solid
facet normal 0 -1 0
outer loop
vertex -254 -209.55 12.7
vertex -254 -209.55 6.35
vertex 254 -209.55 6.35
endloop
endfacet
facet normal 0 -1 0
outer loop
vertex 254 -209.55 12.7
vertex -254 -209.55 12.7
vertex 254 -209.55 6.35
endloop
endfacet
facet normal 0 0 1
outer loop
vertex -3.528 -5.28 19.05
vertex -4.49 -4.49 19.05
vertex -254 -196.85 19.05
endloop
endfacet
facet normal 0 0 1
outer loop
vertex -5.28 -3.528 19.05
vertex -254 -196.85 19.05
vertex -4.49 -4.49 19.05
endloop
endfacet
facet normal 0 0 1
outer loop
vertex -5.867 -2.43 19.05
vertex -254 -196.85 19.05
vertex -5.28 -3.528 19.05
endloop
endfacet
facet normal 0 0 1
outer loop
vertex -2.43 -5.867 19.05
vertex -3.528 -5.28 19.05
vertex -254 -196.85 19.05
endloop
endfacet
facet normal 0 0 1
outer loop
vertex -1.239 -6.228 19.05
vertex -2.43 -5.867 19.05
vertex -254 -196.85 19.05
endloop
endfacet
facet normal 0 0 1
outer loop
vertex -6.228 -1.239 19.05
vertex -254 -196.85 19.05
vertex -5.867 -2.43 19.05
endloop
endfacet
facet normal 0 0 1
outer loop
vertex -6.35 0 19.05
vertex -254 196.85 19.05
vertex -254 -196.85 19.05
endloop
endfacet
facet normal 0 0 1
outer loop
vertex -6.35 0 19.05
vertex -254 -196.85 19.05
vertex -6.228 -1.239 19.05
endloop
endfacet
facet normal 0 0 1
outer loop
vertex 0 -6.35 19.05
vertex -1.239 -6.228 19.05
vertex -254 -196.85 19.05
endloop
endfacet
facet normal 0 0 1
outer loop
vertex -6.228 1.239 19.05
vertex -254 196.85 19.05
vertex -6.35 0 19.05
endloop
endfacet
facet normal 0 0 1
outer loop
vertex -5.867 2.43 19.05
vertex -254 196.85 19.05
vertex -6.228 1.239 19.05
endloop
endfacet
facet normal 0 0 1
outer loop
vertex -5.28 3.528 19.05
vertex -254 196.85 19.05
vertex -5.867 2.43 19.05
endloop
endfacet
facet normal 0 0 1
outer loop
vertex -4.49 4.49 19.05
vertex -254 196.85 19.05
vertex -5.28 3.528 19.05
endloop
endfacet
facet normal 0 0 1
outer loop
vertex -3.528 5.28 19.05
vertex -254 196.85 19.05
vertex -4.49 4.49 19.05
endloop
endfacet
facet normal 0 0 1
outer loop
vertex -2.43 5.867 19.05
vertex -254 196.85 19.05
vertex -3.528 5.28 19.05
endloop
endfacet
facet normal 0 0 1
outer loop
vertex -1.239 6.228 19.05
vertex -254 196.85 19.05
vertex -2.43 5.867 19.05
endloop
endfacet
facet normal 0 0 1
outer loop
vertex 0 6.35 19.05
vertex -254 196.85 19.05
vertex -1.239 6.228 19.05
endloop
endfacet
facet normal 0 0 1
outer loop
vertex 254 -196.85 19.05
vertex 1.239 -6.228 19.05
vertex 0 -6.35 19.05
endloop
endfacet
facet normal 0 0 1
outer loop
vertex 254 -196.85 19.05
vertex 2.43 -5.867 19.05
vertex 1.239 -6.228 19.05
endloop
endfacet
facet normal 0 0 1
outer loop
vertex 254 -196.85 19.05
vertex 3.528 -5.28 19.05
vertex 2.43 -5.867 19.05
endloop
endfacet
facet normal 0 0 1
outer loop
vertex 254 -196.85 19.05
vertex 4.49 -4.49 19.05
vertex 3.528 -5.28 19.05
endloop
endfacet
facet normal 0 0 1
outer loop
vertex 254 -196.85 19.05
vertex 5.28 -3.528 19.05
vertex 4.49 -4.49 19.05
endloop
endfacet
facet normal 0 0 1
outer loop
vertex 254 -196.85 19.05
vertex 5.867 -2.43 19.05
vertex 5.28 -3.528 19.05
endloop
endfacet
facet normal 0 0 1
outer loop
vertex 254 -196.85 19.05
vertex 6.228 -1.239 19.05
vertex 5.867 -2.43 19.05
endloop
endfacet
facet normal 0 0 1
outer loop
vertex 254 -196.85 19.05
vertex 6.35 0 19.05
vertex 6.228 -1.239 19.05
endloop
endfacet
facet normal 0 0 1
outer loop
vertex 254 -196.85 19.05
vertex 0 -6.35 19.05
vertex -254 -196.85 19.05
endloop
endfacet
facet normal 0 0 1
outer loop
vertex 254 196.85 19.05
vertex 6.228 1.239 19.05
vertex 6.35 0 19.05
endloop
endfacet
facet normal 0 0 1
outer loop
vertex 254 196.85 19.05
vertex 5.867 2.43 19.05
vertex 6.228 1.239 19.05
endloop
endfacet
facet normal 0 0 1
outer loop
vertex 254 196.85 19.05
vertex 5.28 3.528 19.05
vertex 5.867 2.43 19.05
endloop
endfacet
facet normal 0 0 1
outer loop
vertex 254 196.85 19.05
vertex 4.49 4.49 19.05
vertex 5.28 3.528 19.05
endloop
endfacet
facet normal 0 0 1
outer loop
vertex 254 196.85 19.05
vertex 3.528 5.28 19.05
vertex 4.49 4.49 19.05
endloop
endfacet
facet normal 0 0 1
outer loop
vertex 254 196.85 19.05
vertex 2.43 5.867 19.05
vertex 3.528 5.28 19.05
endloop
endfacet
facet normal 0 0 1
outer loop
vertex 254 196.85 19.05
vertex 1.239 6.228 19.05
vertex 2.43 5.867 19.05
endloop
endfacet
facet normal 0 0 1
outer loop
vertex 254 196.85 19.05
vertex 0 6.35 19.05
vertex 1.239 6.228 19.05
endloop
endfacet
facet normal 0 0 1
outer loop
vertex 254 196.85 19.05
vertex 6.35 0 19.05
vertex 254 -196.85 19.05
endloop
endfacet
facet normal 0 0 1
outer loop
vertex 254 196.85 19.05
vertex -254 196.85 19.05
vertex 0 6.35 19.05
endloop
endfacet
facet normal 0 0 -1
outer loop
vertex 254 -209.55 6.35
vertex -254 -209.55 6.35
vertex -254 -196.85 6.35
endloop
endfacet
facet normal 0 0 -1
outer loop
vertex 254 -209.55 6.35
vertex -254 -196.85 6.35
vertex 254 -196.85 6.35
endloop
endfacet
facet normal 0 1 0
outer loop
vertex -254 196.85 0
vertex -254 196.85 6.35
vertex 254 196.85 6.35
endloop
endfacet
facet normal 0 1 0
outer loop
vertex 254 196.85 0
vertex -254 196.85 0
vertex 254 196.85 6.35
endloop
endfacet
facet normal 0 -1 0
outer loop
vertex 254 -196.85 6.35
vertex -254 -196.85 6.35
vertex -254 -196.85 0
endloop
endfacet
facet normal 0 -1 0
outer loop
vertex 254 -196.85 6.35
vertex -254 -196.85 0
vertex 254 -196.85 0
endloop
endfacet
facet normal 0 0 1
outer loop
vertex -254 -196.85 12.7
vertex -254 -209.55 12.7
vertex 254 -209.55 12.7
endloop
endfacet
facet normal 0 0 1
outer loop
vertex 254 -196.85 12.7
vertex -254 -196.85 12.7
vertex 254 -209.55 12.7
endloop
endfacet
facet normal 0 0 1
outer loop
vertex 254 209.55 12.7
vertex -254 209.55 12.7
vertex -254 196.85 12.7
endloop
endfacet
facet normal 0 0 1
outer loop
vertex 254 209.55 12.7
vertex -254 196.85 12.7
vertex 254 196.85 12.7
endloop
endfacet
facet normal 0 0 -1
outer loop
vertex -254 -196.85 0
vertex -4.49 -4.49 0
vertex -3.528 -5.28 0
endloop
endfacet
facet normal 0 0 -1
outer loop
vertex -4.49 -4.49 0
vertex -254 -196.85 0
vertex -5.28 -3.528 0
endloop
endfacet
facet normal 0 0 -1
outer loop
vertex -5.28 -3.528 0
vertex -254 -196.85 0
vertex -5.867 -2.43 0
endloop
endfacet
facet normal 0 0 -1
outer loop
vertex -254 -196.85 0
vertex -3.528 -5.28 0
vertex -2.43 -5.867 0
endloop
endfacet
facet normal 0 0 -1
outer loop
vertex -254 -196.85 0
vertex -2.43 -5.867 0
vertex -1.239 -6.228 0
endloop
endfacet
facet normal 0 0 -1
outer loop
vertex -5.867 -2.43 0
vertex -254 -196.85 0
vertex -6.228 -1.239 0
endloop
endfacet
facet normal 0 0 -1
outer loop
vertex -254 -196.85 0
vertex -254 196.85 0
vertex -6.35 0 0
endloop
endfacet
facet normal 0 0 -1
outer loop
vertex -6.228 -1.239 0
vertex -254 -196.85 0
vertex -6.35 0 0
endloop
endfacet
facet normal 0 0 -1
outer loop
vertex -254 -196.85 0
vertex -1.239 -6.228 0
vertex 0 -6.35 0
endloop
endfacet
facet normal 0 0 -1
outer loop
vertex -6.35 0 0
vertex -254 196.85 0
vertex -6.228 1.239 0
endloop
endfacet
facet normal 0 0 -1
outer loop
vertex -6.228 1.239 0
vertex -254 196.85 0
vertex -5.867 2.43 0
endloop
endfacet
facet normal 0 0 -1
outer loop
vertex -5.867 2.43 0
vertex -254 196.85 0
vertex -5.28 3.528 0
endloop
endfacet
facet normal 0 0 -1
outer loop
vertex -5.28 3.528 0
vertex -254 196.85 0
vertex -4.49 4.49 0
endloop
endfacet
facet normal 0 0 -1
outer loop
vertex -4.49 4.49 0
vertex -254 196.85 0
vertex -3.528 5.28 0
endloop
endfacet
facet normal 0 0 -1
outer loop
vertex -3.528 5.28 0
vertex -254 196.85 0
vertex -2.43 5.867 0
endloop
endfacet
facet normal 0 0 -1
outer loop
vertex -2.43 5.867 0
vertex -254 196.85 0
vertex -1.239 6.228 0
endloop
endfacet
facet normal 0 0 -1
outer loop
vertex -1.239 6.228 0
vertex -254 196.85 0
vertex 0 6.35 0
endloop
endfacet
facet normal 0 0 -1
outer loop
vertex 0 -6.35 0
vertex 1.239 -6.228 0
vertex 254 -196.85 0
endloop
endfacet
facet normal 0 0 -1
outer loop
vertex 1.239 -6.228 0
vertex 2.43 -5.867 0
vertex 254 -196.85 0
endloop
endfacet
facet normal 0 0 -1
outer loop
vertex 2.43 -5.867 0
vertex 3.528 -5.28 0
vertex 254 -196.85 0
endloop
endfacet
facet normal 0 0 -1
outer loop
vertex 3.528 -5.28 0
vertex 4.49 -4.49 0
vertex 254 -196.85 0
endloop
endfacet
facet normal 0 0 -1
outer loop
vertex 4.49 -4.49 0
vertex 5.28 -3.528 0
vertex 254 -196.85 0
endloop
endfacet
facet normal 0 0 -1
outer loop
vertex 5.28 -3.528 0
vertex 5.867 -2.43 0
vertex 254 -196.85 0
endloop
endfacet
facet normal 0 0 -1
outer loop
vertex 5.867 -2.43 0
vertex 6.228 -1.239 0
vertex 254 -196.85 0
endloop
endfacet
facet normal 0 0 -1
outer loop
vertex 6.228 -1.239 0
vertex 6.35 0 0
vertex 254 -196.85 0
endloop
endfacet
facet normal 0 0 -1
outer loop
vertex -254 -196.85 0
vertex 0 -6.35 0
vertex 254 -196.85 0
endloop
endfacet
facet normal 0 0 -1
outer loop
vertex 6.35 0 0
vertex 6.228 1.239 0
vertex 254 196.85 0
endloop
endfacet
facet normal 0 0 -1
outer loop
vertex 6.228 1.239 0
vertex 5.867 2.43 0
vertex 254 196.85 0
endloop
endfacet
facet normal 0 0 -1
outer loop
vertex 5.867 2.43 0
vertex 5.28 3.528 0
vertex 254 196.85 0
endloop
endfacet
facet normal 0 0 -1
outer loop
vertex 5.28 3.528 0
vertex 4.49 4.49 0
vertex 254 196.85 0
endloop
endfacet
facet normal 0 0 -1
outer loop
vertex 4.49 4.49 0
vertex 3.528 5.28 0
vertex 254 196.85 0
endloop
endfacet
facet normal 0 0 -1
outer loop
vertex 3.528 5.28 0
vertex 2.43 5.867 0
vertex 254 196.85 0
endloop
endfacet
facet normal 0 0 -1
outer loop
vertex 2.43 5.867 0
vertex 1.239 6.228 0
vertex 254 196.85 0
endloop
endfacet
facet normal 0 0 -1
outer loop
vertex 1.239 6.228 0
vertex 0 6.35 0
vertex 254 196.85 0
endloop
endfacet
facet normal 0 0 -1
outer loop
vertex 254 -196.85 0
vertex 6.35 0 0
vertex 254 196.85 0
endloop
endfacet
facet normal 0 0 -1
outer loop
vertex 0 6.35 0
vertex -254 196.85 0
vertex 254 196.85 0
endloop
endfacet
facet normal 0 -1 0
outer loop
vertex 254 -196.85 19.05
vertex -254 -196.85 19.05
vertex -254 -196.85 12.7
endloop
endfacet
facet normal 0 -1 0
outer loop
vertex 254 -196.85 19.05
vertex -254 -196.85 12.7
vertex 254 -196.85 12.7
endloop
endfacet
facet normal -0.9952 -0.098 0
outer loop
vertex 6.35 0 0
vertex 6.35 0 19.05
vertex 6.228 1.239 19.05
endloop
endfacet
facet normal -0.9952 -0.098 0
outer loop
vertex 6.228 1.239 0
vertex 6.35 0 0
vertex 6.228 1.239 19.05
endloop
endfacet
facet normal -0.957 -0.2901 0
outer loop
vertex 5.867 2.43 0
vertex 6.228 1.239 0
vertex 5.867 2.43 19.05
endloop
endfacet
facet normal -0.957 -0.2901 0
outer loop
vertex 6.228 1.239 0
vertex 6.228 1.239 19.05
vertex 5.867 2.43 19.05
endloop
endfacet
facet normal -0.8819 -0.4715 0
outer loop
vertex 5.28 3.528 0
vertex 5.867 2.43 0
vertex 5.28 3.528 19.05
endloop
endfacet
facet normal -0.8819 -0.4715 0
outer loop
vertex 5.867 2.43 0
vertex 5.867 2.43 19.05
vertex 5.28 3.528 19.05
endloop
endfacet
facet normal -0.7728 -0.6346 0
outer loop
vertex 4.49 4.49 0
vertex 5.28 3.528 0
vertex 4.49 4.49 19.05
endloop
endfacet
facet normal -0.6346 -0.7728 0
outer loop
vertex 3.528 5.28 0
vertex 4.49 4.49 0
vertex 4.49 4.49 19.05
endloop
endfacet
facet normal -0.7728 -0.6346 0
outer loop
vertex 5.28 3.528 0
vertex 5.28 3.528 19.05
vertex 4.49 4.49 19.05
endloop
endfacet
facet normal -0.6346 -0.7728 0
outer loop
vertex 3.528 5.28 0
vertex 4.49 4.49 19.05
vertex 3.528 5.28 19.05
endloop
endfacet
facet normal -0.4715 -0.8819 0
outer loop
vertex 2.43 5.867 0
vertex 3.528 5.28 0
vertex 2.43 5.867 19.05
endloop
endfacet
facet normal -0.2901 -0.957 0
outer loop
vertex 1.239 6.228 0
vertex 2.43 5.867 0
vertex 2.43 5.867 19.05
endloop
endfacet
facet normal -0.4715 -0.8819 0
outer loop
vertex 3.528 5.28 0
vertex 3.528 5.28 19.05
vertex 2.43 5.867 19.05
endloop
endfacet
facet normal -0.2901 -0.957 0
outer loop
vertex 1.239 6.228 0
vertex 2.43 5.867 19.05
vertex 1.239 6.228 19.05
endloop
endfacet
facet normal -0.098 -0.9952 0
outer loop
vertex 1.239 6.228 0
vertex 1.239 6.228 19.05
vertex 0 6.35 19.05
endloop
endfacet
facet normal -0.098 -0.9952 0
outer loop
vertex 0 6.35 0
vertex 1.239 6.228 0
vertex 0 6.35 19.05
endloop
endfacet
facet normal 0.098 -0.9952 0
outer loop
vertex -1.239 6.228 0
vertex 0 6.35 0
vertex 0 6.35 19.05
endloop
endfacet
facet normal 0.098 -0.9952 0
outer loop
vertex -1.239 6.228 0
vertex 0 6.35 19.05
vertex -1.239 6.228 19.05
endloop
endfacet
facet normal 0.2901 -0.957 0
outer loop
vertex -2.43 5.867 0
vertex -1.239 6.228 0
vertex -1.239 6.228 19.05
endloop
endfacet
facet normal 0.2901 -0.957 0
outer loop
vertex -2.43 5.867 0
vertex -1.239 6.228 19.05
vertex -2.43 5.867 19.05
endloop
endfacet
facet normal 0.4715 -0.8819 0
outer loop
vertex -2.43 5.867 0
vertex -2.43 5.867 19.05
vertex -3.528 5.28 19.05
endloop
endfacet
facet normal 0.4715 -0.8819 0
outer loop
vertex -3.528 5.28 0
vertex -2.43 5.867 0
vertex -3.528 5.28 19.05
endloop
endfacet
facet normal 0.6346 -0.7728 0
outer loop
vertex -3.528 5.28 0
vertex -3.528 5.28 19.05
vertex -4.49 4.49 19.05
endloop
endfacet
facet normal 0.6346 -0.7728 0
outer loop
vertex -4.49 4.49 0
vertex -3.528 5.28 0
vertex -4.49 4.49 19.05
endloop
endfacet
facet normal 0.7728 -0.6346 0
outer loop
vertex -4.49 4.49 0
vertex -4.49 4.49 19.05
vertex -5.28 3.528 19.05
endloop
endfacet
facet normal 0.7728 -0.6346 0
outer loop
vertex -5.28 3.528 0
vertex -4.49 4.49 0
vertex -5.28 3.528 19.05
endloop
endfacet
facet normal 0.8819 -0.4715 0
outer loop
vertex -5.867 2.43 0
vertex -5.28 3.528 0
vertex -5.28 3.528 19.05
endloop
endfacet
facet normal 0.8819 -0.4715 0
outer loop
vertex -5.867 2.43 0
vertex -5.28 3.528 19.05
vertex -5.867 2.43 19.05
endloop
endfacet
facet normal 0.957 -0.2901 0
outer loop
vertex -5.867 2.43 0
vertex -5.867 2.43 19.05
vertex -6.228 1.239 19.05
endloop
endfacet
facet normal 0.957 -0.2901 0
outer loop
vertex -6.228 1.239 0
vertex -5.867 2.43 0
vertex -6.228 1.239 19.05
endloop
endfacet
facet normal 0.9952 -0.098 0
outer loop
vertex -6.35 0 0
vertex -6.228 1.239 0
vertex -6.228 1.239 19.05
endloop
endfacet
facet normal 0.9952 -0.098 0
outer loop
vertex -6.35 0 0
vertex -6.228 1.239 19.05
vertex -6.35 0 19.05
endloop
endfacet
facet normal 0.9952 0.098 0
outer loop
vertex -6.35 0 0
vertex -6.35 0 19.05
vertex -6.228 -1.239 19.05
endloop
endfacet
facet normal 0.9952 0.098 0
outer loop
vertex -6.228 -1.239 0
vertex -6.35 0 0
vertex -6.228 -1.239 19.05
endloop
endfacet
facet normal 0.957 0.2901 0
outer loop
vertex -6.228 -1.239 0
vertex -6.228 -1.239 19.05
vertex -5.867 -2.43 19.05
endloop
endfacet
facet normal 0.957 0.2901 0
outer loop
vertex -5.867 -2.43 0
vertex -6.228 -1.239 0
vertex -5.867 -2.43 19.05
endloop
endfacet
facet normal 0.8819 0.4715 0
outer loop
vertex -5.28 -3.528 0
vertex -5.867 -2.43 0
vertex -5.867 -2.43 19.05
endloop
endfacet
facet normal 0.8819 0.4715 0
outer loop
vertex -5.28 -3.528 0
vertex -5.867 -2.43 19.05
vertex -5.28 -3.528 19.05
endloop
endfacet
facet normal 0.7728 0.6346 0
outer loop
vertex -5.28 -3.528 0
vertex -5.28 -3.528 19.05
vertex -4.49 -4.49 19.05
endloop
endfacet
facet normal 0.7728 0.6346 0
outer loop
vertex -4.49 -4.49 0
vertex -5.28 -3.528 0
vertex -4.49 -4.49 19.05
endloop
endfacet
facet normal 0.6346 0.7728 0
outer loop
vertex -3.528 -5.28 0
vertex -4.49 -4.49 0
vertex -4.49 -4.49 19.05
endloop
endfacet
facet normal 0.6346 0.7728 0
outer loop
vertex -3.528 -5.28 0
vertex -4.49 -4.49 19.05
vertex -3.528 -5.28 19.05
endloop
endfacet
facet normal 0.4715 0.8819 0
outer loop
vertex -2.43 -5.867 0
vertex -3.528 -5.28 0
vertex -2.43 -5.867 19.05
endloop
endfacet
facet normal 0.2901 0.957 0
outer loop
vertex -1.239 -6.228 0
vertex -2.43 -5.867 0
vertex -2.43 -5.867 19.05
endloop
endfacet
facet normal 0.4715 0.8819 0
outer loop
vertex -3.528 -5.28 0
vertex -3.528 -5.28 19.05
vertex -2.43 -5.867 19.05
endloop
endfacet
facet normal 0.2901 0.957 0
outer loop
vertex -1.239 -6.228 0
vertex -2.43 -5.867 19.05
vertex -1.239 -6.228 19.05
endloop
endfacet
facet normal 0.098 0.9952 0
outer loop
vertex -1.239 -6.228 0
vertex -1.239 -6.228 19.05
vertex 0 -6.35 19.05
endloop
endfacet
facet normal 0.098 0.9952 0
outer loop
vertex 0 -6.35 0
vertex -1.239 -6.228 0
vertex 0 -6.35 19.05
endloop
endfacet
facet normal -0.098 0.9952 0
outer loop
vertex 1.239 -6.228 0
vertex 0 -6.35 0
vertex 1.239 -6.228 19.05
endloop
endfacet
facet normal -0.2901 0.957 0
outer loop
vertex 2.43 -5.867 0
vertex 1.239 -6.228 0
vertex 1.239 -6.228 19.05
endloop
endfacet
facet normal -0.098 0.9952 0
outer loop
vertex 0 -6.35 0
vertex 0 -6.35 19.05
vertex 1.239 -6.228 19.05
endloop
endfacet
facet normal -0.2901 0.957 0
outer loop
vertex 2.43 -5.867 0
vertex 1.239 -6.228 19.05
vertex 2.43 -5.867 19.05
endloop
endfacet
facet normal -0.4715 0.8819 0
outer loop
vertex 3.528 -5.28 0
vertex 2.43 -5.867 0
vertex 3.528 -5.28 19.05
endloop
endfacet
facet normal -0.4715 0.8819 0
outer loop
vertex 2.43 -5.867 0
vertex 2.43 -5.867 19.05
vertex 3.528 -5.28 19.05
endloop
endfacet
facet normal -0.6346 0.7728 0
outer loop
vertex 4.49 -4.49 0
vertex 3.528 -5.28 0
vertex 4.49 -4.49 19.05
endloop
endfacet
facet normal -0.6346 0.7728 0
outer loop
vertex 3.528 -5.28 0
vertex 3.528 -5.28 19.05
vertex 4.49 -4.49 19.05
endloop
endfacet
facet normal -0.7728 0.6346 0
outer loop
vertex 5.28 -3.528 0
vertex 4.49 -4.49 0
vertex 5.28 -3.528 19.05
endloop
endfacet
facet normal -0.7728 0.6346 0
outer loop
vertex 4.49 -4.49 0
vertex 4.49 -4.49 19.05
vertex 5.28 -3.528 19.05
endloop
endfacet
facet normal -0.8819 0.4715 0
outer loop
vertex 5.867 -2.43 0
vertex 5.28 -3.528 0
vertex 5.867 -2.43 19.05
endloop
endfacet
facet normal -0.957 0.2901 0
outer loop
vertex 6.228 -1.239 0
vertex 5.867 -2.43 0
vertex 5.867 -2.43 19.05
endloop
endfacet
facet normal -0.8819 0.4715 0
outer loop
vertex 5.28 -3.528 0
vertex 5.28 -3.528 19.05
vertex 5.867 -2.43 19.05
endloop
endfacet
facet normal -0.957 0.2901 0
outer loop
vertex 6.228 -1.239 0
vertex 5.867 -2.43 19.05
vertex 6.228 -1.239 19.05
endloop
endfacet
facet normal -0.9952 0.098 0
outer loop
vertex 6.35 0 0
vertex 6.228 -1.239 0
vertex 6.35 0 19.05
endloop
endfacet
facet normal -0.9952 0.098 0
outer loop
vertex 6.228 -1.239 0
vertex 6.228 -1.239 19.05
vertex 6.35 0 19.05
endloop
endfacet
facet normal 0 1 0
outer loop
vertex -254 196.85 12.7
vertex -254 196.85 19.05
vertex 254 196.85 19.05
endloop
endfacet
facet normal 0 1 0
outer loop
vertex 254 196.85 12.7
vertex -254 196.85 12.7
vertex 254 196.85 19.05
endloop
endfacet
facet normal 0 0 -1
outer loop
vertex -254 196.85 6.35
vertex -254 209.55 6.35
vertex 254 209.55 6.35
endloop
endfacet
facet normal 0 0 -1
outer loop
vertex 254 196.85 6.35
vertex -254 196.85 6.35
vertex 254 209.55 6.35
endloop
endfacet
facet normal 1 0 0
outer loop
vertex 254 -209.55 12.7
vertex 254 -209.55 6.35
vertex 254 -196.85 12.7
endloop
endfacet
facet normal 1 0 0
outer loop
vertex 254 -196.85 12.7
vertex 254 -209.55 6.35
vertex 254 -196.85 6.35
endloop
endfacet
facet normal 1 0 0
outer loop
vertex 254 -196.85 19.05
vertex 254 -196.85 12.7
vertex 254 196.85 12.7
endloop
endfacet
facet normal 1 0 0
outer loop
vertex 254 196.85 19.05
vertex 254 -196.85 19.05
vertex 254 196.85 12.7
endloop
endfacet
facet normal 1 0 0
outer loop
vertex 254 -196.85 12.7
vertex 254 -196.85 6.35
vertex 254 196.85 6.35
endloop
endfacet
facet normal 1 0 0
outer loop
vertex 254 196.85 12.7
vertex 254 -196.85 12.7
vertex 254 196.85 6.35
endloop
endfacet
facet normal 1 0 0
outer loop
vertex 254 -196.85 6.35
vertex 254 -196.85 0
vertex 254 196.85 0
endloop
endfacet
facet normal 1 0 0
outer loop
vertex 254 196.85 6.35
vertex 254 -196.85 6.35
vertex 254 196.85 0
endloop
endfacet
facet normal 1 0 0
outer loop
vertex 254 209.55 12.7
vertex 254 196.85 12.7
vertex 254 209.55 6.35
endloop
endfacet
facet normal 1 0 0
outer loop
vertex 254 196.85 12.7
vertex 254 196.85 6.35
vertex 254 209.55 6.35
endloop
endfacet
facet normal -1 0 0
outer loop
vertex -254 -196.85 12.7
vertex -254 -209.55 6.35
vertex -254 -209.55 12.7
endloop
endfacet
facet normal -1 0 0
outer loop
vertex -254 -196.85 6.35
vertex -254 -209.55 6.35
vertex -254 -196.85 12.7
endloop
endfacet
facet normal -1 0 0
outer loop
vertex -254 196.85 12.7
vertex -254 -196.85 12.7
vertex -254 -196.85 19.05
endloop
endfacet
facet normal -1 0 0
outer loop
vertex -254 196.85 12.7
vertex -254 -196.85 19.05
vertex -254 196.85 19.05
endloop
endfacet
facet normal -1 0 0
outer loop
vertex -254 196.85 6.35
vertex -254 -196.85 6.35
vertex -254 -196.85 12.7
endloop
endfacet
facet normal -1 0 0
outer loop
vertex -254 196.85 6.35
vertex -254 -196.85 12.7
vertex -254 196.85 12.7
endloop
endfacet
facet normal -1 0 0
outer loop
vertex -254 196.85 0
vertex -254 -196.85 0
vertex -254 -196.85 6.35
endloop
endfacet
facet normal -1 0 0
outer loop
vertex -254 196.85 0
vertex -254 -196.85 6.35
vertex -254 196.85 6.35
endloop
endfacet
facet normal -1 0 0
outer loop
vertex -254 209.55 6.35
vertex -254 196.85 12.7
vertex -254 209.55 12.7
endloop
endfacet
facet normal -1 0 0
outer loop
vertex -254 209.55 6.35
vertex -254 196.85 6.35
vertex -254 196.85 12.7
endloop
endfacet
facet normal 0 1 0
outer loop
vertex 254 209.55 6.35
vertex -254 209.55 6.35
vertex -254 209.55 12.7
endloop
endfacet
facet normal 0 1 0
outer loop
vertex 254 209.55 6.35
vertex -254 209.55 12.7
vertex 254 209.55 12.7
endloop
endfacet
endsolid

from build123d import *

# Parameters (mm, degrees)
F0_W     = 508
F0_H     = 419.1
F1_DEPTH = 19.05
F2_W     = 508
F2_H     = 6.35
F3_DEPTH = 12.7
F4_R     = 6.35
F5_DEPTH = 19.051


# Not quite as in the source:
# - a pattern or mirror of a feature is missing from the dataset's text; its kind, count and spacing are read off the source's solid


with BuildPart() as f1:
    # F0 (on Top) → F1 (new body)
    with BuildSketch(Plane.XY):
        Rectangle(F0_W, F0_H)
    extrude(amount=F1_DEPTH)

    # F2 (on face) → F3 (cut)
    with BuildSketch(Plane.XZ.offset(209.55)):
        with Locations((0, 3.175)):
            Rectangle(F2_W, F2_H)
        with Locations((0, 15.875)):
            Rectangle(F2_W, F2_H)
    f3 = extrude(amount=-F3_DEPTH, mode=Mode.SUBTRACT)

    # F3_copies: F3 across plane
    add(f3.mirror(Plane.ZX), mode=Mode.SUBTRACT)

    # F4 (on face) → F5 (cut, through all)
    with BuildSketch(Plane.XY.offset(19.05)):
        Circle(F4_R)
    extrude(amount=-F5_DEPTH, mode=Mode.SUBTRACT)


solid = f1.part
